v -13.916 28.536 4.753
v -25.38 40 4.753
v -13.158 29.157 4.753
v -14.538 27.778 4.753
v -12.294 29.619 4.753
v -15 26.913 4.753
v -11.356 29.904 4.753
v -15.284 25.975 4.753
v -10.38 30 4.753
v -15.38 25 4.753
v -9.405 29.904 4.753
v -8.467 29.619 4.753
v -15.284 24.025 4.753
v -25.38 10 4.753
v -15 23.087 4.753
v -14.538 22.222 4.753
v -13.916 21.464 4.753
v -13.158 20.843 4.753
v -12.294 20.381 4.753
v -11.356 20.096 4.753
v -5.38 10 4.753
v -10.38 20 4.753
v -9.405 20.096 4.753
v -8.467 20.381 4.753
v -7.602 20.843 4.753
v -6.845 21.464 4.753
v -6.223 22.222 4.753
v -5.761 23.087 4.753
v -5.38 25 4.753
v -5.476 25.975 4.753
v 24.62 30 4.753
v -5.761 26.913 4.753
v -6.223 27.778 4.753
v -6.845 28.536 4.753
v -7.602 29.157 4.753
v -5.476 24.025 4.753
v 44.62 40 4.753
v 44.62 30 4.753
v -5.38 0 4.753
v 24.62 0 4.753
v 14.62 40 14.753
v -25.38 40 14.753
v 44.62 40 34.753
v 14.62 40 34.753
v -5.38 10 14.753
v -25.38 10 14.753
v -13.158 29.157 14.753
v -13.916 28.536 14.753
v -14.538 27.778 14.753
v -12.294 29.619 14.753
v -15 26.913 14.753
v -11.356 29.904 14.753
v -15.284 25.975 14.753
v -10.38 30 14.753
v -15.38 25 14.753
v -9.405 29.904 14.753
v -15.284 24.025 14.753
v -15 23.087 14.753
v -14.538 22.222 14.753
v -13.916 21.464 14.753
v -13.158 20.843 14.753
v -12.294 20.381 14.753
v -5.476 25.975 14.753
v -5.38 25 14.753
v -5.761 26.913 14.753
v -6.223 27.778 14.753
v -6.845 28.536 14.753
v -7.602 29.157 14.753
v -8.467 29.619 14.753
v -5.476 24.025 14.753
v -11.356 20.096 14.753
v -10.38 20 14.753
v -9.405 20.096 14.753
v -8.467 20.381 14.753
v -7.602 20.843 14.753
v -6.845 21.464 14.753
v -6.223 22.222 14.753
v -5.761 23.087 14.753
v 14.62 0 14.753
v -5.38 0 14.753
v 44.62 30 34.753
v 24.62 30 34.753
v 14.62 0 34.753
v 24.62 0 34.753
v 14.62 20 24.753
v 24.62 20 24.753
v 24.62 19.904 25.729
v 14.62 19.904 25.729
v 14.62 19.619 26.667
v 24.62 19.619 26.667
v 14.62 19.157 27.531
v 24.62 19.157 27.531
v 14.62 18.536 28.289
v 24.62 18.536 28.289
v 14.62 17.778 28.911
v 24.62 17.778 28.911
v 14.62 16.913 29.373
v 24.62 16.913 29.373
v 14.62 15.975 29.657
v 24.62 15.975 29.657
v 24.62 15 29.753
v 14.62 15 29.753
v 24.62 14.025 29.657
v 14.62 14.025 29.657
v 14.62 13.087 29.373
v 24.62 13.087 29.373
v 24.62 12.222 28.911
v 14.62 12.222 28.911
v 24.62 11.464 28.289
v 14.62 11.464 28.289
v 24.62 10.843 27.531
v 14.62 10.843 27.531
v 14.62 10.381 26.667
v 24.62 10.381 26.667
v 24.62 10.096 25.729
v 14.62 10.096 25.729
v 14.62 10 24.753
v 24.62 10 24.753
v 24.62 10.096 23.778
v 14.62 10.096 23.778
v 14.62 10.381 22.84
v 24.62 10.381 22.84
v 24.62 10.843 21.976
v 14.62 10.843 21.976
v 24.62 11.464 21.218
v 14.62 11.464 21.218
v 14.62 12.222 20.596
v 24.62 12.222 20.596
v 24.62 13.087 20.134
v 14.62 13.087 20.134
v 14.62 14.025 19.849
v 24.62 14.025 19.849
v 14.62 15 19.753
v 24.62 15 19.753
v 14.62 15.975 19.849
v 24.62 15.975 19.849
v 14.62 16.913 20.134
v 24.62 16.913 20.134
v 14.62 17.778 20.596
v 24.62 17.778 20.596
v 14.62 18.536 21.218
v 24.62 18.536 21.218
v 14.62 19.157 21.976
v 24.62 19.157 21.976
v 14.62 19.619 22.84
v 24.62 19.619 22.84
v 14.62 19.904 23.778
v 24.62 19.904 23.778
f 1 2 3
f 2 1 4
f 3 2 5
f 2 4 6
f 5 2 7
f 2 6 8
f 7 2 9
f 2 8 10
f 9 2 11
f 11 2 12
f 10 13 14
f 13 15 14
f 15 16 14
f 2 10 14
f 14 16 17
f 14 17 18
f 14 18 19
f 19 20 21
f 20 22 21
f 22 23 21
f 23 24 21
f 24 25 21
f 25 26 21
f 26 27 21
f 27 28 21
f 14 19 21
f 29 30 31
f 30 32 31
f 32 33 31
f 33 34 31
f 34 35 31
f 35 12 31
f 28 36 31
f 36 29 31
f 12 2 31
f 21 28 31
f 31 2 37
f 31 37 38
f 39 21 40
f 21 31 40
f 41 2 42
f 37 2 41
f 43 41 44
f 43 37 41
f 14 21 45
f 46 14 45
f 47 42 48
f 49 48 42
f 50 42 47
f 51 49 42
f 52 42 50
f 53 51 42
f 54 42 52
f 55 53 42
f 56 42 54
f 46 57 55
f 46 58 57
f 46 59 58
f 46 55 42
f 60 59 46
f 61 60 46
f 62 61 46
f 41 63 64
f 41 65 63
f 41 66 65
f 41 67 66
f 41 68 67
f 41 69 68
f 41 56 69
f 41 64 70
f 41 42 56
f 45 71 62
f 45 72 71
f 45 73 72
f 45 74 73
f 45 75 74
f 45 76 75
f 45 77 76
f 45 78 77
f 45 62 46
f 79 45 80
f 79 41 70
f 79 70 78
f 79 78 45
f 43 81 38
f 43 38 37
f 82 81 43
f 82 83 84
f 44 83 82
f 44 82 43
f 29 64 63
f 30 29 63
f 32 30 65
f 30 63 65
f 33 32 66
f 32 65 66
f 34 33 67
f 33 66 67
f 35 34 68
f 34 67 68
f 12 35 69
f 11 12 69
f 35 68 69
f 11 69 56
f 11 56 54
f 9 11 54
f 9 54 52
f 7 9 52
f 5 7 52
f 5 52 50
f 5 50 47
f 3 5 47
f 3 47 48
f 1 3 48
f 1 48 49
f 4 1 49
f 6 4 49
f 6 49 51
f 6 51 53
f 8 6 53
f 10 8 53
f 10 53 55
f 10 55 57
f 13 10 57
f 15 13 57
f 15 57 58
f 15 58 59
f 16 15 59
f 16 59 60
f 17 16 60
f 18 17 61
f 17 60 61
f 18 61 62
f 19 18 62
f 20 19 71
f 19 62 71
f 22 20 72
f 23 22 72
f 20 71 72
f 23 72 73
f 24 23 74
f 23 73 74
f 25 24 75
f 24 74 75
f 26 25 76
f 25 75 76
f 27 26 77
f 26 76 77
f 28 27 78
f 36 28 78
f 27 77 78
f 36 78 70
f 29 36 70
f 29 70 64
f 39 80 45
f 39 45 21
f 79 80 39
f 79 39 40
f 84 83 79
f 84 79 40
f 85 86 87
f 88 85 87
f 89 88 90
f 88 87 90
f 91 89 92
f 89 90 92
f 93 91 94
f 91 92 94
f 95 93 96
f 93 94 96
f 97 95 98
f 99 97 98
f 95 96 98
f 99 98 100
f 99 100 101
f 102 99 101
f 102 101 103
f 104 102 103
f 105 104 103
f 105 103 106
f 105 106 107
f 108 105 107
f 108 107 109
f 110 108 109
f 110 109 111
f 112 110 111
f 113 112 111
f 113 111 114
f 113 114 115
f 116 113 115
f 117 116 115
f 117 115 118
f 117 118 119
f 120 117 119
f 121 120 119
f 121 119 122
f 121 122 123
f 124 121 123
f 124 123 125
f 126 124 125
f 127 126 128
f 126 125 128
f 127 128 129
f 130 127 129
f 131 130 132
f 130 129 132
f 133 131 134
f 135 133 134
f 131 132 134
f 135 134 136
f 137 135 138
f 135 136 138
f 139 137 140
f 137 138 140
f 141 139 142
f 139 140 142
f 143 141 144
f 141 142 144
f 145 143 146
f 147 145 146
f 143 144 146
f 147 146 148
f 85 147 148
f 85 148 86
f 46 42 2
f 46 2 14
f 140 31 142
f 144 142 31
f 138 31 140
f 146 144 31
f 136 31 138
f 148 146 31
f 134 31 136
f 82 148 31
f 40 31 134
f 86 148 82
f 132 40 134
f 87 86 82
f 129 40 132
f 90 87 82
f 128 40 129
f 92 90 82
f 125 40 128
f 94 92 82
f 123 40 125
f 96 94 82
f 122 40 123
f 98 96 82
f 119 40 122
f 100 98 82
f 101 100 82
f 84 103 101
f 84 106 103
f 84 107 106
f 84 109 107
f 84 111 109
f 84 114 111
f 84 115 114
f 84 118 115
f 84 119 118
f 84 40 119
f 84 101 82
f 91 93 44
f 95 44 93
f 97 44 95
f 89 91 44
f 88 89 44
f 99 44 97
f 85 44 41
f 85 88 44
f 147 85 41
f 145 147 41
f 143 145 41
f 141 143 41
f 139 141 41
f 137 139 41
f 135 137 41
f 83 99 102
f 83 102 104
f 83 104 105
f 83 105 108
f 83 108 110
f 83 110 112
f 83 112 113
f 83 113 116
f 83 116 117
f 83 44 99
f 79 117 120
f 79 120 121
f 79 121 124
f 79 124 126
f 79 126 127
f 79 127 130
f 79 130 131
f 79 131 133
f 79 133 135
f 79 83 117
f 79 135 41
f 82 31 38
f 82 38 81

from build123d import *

# Parameters (mm, degrees)
F1_DEPTH = 40
F2_W     = 10
F2_H     = 30
F3_DEPTH = 20
F4_R     = 5
F5_DEPTH = 30.001
F6_W     = 30
F6_H     = 10
F7_DEPTH = 20
F8_R     = 5
F9_DEPTH = 10.001


with BuildPart() as f1:
    # F0 (on Front) → F1 (new body)
    with BuildSketch(Plane.XZ):
        Polygon((-5.380323, 14.753425), (-5.380323, 4.753425), (24.619677, 4.753425), (24.619677, 34.753425), (14.619677, 34.753425), (14.619677, 14.753425), align=None)
    extrude(amount=-F1_DEPTH)

    # F2 (on face) → F3 (join)
    with BuildSketch(Plane.YZ.offset(24.619677)):
        with Locations((35, 19.753425)):
            Rectangle(F2_W, F2_H)
    extrude(amount=F3_DEPTH)

    # F4 (on face) → F5 (cut, through all)
    with BuildSketch(Plane.YZ.offset(24.619677)):
        with Locations((15, 24.753425)):
            Circle(F4_R)
    extrude(amount=-F5_DEPTH, mode=Mode.SUBTRACT)

    # F6 (on face) → F7 (join)
    with BuildSketch(Plane(origin=(-5.380323, 0, 0), x_dir=(0, -1, 0), z_dir=(-1, 0, 0))):
        with Locations((-25, 9.753425)):
            Rectangle(F6_W, F6_H)
    extrude(amount=F7_DEPTH)

    # F8 (on face) → F9 (cut, through all)
    with BuildSketch(Plane.XY.offset(14.753425)):
        with Locations((-10.380323, 25)):
            Circle(F8_R)
    extrude(amount=-F9_DEPTH, mode=Mode.SUBTRACT)


solid = f1.part
